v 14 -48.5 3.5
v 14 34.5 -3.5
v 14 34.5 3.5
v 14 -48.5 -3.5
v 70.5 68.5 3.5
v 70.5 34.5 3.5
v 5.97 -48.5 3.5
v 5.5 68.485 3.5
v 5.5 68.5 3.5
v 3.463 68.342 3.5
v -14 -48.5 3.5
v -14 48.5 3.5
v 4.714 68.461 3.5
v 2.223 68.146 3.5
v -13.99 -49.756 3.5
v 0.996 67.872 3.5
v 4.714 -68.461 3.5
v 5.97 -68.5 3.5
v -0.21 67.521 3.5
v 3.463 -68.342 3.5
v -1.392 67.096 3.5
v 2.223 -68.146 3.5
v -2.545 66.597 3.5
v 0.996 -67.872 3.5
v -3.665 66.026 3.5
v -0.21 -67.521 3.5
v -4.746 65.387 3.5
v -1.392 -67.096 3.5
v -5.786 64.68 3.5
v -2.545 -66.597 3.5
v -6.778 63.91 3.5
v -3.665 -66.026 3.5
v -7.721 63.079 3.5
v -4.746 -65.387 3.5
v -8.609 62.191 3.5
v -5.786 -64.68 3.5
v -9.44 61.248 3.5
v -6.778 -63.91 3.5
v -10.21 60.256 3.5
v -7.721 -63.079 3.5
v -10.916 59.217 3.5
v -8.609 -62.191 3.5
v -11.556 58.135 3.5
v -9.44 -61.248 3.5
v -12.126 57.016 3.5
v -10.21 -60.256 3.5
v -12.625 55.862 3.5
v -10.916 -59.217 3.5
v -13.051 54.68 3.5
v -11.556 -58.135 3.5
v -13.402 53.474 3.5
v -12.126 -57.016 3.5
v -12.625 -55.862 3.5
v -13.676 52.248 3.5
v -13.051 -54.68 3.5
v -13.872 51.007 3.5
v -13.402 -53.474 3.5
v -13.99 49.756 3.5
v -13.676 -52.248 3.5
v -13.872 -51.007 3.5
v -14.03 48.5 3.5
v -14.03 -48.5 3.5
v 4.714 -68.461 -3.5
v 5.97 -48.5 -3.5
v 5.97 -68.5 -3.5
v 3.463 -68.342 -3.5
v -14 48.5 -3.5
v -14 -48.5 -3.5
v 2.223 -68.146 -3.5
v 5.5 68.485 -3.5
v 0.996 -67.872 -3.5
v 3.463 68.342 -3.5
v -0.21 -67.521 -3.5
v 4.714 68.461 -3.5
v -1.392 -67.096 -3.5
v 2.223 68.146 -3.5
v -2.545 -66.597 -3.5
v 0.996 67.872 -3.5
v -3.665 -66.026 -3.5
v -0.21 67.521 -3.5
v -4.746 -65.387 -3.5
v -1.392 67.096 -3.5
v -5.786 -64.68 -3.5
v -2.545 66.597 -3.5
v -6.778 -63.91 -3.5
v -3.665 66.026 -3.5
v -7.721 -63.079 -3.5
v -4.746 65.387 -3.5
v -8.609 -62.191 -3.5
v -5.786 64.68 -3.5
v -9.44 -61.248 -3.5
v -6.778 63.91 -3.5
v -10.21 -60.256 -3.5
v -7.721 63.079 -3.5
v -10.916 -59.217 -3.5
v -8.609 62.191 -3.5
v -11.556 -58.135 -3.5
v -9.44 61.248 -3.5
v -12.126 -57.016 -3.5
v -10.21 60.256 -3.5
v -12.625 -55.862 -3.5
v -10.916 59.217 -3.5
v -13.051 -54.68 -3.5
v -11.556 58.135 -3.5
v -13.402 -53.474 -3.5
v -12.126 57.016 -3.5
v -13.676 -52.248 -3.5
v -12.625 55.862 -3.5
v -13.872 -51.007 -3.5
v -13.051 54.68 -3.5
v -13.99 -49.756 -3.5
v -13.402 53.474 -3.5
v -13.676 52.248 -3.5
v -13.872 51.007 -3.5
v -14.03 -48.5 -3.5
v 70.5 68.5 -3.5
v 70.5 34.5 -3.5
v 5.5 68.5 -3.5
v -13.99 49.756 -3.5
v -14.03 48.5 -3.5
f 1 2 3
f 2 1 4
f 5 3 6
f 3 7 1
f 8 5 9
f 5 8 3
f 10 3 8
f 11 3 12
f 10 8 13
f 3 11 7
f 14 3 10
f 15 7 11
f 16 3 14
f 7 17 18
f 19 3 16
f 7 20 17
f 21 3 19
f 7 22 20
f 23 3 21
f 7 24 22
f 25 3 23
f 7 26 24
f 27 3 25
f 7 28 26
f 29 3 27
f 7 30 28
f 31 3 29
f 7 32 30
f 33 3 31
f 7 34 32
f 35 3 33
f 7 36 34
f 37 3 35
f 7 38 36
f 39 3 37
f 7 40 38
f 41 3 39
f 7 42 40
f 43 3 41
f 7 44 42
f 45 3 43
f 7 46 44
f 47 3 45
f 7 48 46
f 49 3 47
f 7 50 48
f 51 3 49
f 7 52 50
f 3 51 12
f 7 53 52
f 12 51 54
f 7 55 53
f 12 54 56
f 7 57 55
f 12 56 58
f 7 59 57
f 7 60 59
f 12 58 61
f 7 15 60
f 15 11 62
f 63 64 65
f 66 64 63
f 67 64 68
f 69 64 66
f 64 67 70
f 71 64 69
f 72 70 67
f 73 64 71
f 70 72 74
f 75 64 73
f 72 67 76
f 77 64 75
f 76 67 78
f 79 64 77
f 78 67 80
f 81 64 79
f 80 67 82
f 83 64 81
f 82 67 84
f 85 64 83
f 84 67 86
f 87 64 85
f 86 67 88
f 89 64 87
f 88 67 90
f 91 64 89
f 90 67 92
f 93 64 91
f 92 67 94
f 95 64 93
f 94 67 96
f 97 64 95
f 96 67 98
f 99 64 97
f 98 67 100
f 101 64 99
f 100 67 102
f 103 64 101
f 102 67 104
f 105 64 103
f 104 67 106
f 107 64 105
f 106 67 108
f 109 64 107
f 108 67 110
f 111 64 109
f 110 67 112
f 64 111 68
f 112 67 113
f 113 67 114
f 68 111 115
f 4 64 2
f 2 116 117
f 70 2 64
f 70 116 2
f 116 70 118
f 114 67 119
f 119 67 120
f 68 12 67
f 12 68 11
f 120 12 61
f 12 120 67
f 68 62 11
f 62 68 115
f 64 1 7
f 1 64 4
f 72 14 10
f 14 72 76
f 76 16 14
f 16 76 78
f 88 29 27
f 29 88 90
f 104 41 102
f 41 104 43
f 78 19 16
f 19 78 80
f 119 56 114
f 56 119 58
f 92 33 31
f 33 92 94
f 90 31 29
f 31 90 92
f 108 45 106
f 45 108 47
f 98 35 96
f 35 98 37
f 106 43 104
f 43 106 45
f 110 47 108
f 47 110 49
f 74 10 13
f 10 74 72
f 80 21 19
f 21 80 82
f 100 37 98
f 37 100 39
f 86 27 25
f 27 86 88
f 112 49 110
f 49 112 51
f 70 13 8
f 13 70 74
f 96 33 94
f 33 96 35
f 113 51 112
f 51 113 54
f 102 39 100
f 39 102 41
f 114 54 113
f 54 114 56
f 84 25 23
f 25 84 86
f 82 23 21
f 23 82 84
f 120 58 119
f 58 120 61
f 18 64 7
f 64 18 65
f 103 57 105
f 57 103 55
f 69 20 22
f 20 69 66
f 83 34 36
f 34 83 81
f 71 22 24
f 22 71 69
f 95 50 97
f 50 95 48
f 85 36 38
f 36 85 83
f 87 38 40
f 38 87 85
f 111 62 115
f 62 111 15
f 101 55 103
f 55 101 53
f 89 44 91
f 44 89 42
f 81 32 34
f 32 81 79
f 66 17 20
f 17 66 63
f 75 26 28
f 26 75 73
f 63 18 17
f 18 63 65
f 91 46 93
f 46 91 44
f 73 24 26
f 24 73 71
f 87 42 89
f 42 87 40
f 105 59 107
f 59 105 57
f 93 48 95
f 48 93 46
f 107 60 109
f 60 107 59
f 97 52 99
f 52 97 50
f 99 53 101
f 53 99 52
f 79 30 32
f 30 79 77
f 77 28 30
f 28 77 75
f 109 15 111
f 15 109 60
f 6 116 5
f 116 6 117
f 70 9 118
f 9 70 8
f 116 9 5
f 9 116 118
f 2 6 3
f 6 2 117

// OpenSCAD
$fn=96;

//Plate measurements
height = 7;
plate_width = 300;
plate_depth = 150;

//bolt holes
h_d_between = 170;
v_d_between = 121;
d_from_top = 15.5;
d_from_bot = 17.5;
d_from_side = 65;



//corners
corner_base = 20;
corner_radius = 90;


extension_width = 65;
width = 210-extension_width;
depth = 29;
side_height = 97;
side_width = 28;

left_x = -112;
left_y = 0;
left_z = 0;
right_x=width/2+extension_width/2;

//Connectors
con_height = height;
con_width = 15;
con_depth = depth+6;

nut_height = 2.4;
nut_rad = 3.2;
nut_width = 5;
screw_height = 1.65;
screw_rad = 1.7;
screw_length = 2;


font = "DejaVu Sans:style=Bold";
letter_size = 18;
topstring = "Veteran";
bottomstring = "US Navy";

module topbanner() {
    difference() {
        translate([ 0, 2, 0 ])
        cube(size=[width, depth+5, height], center = true );
        
// bolt holes
        translate ([ -88.9, depth/2-15.5, -5 ])
            cylinder( h = 10, r = 3 );
        translate ([ 88.9, depth/2-15.5, -5 ])
            cylinder( h = 10, r = 3 );

// inserts        
        translate([-83, -9, -1.5]) 
            cube(size=[extension_width/2+1, depth-10, height-3]);
        translate([59.5, -9, -1.5]) 
            cube(size=[extension_width/2+1, depth-10, height-3]);

//text and emblems
        translate([0, 0, 2])
            linear_extrude(1) {
                text(topstring, size = letter_size, font = font, halign = "center", valign = "center", $fn = 96);

        }
    }
}

module bottombanner() {
    translate([0, -side_height-depth-4.5, 0]) {
        difference() {
            cube(size=[width, depth, height], center = true);
            
//inserts
            translate([-83, -9, -1.5]) 
                cube(size=[extension_width/2+1, depth-10, height-3]);
            translate([59.5, -9, -1.5]) 
               cube(size=[extension_width/2+1, depth-10, height-3]);
            
// bolt holes
        translate ([ -88.9, depth/2-13, -5 ])
            cylinder( h = 10, r = 3 );
        translate ([ 88.9, depth/2-13, -5 ])
            cylinder( h = 10, r = 3 );

//text and emblems
        }            
            translate([0, 0, 3])
            linear_extrude(1) {
                    text(bottomstring, size = letter_size, font = font, halign = "center", valign = "center", $fn = 64);
        }
    }
}

module side() {
  difference() {
    union() {
      cube(size=[side_width, side_height, height], center = true );
    }
  }
}
module extension(){
  cube([extension_width, depth+5, height ], center = true );
}

/*              
              //bottom mirror
              mirror([ 0, 1, 0 ]){
              // corner
              translate([ corner_base*.3, side_height*.64, -20 ]) 
              rotate([ 270, 0, 0 ]) 
                corner( corner_base, 90, height ); //top left corner
              
                
              // extension
                translate([ extension_width/2+6, side_height/2+16.5, 0 ])
                    cube([extension_width, depth+5, height ], center = true );
            }
          }
          // bolt hole
            translate ([ extension_width-15, side_height/2+16.5, 0 ])
                cylinder( h = 10, r = 3, center = true );
                
         // connector

            translate([ extension_width, side_height/2+16.5, -con_height*.25 ])
            cube([ con_width, con_depth, con_height/2 ], center = true);
            
         // nuts
            translate([ extension_width, side_height/2+25, 5 ])
            cylinder( h = nut_height, r = nut_rad, $fn = 6, center = true );
            translate([ con_depth+con_width/2+2, 10, 1.75 ])
            cylinder( h = nut_height, r = nut_rad, $fn = 6, center = true );
      
         // screw holes
            translate([ con_depth+con_width/2+2, 10, 0 ])
            cylinder( h = screw_height, r = screw_length, center = true );
            translate([ con_depth+con_width/2+2, 10, 0 ])
            cylinder( h = screw_height, r = screw_length, center = true );

        // bottom
           mirror([ 0, 1, 0 ]) {
             // bolt hole
            translate ([ extension_width-15, side_height/2+16.5, 0 ])
                cylinder( h = 10, r = 3, center = true );
                
         // connector

            translate([ extension_width-2, side_height/2+17, -con_height*.25 ])
            cube([ con_width, con_depth, con_height/2 ], center = true);
            
         // nuts
            translate([ con_depth+con_width/2+2, 10, 1.75 ])
            cylinder( h = nut_height, r = nut_rad, $fn = 6, center = true );
      
         // screw holes
            translate([ con_depth+con_width/2+2, 10, 0 ])
            cylinder( h = screw_height, r = screw_length, center = true );
           }
          

            translate([ -13, -4, 1 ])
                  rotate([ 0, 0, 45 ])
            scale([ .20, .20, .25 ])
            insignia();
         
         // bolt holes
            translate ([ 33, depth/2-15.5, -5 ])
                cylinder( h = 10, r = 3 );
            translate ([ 33, -124.5, -5 ])
                cylinder( h = 10, r = 3 );   
        
       
         mirror([ 1, 0, 0 ]) {
           
            translate([ con_depth*1.35, 2, -con_height*.25 ])
            cube([ con_width, con_depth, con_height/2 ], center = true);
            
         // nuts
            translate([ con_depth+con_width/2+2, 10, 1.75 ])
            cylinder( h = nut_height, r = nut_rad, $fn = 6, center = true );
      
         // screw holes
            translate([ con_depth+con_width/2+2, 10, 0 ])
            cylinder( h = screw_height, r = screw_length, center = true );
         //}

            }
    }
}

module rightside() {
    translate([ right_x, left_y, left_z]) {
        mirror([ 1, 0, 0 ]) {
            difference() {
                union() {
                //top extension
                    translate([ 0, 0+2, 0 ])
                    cube([extension_width, depth+5, height ], center = true );

                //top corner                
                    translate([ -extension_width/2, left_y-depth/2, -depth ]) 
                    rotate([ 270, 0, 0 ]) 
                        corner( depth, 90, height ); //top corner
                
               //side
                    translate([ -38, -side_height/2-depth/2, 0 ]) 
                        cube(size=[side_width, side_height, height], center = true );

                //bottom corner
                    translate([-extension_width/2, -side_height-depth/2, depth]) 
                        rotate([ 90, 0, 0 ]) 
                            corner( depth, 90, height ); //bottom corner
                //bottom extension
                    translate([-depth/2+depth/2, -side_height-depth, ]) 
                        cube([ extension_width, depth, 6 ], center = true); //bottom extension
                //top insert
                    translate([ 33, 0.5, 0 ])    
                        cube([extension_width/2, depth-10.5, height-4 ], center = true );
                //bottom insert
                    translate([ 33, -side_height-depth+.5, 0 ]) 
                        cube([ extension_width/2, depth-10.5, height-4 ], center = true); //bottom inset
            }
            // bolt holes
                translate ([ 15, depth/2-15.5, -5 ])
                    cylinder( h = 10, r = 3 );
                translate ([ 15, -124.5, -5 ])
                    cylinder( h = 10, r = 3 );
           
            }
        }
    }
}
*/
module inserts() {
    //translate([left_x, left_y, left_z]) {
            union() {
              //  translate([depth/2, -side_height/2-depth+2, -.5]) 
                //    cube(size=[width/5-1, depth-4, height-4]); //bottom insert
                translate([depth/2+49.5, side_height/2-58.7, -1.5]) 
                    cube(size=[width/5+9, depth-8.5, 2.8]); //top insert
            }
        }
    //}

module corner(corner_base = 10, corner_angle = 45, corner_height = 20) {
corner_radius = corner_base;
rotate_extrude( angle = corner_angle, $fn = 100 )
translate( [-corner_radius/2, 0] )
    union(){
        translate( [0, -corner_base] )
            square([ corner_base, corner_height ], center = true);
    }
}

module insignia() {
    //union() {
       // cube([ 35, 20, 4 ]);
                //linear_extrude(2) {
                   
                    //translate([ 17, 10, 0 ])
                      //  import(file = "/Users/darrylestes/Downloads/senior_driver/sonar_tech1.svg", center = true, dpi = 90);
                  
                  //"/Users/darrylestes/Documents/3d_projects/sonar_tech/Navy_Sonar_Technician_Emblem_4116858/images/featured_preview_83311.png", center = true, dpi = 90);
            
      //          }
                //scale([ .25, .25, .25 ])
                import(file ="/Users/darrylestes/Documents/3d_projects/sonar_tech/Navy_Sonar_Technician_Emblem_4116858/files/Sonar_Tech.stl" );
      //      }
        }

module border() {
  //  difference() {
        translate([ -150, -138, -6 ])
        cube([ 300, 150, 4 ]);
    }

module leftside() {
  side();
  rotate([ 180, 0, 0 ])
  translate([ side_width/4.69, -corner_base/2-corner_radius/2+6.5, height*3-1 ]) 
  corner(corner_base, corner_radius, height);
  
  
  translate([ side_width/4.69, -corner_base/2-corner_radius/2+6.5, height*3-1 ]) 
  rotate([ 0, 0, 0 ])
  corner(corner_base, corner_radius, height);
  
  translate([ side_width+corner_base/2, side_height/2+3, 0, ])
  extension();
} 

//}
//insignia();
//topbanner();
//bottombanner();
//extension();
leftside();
//rightside();
//inserts();
//border();
